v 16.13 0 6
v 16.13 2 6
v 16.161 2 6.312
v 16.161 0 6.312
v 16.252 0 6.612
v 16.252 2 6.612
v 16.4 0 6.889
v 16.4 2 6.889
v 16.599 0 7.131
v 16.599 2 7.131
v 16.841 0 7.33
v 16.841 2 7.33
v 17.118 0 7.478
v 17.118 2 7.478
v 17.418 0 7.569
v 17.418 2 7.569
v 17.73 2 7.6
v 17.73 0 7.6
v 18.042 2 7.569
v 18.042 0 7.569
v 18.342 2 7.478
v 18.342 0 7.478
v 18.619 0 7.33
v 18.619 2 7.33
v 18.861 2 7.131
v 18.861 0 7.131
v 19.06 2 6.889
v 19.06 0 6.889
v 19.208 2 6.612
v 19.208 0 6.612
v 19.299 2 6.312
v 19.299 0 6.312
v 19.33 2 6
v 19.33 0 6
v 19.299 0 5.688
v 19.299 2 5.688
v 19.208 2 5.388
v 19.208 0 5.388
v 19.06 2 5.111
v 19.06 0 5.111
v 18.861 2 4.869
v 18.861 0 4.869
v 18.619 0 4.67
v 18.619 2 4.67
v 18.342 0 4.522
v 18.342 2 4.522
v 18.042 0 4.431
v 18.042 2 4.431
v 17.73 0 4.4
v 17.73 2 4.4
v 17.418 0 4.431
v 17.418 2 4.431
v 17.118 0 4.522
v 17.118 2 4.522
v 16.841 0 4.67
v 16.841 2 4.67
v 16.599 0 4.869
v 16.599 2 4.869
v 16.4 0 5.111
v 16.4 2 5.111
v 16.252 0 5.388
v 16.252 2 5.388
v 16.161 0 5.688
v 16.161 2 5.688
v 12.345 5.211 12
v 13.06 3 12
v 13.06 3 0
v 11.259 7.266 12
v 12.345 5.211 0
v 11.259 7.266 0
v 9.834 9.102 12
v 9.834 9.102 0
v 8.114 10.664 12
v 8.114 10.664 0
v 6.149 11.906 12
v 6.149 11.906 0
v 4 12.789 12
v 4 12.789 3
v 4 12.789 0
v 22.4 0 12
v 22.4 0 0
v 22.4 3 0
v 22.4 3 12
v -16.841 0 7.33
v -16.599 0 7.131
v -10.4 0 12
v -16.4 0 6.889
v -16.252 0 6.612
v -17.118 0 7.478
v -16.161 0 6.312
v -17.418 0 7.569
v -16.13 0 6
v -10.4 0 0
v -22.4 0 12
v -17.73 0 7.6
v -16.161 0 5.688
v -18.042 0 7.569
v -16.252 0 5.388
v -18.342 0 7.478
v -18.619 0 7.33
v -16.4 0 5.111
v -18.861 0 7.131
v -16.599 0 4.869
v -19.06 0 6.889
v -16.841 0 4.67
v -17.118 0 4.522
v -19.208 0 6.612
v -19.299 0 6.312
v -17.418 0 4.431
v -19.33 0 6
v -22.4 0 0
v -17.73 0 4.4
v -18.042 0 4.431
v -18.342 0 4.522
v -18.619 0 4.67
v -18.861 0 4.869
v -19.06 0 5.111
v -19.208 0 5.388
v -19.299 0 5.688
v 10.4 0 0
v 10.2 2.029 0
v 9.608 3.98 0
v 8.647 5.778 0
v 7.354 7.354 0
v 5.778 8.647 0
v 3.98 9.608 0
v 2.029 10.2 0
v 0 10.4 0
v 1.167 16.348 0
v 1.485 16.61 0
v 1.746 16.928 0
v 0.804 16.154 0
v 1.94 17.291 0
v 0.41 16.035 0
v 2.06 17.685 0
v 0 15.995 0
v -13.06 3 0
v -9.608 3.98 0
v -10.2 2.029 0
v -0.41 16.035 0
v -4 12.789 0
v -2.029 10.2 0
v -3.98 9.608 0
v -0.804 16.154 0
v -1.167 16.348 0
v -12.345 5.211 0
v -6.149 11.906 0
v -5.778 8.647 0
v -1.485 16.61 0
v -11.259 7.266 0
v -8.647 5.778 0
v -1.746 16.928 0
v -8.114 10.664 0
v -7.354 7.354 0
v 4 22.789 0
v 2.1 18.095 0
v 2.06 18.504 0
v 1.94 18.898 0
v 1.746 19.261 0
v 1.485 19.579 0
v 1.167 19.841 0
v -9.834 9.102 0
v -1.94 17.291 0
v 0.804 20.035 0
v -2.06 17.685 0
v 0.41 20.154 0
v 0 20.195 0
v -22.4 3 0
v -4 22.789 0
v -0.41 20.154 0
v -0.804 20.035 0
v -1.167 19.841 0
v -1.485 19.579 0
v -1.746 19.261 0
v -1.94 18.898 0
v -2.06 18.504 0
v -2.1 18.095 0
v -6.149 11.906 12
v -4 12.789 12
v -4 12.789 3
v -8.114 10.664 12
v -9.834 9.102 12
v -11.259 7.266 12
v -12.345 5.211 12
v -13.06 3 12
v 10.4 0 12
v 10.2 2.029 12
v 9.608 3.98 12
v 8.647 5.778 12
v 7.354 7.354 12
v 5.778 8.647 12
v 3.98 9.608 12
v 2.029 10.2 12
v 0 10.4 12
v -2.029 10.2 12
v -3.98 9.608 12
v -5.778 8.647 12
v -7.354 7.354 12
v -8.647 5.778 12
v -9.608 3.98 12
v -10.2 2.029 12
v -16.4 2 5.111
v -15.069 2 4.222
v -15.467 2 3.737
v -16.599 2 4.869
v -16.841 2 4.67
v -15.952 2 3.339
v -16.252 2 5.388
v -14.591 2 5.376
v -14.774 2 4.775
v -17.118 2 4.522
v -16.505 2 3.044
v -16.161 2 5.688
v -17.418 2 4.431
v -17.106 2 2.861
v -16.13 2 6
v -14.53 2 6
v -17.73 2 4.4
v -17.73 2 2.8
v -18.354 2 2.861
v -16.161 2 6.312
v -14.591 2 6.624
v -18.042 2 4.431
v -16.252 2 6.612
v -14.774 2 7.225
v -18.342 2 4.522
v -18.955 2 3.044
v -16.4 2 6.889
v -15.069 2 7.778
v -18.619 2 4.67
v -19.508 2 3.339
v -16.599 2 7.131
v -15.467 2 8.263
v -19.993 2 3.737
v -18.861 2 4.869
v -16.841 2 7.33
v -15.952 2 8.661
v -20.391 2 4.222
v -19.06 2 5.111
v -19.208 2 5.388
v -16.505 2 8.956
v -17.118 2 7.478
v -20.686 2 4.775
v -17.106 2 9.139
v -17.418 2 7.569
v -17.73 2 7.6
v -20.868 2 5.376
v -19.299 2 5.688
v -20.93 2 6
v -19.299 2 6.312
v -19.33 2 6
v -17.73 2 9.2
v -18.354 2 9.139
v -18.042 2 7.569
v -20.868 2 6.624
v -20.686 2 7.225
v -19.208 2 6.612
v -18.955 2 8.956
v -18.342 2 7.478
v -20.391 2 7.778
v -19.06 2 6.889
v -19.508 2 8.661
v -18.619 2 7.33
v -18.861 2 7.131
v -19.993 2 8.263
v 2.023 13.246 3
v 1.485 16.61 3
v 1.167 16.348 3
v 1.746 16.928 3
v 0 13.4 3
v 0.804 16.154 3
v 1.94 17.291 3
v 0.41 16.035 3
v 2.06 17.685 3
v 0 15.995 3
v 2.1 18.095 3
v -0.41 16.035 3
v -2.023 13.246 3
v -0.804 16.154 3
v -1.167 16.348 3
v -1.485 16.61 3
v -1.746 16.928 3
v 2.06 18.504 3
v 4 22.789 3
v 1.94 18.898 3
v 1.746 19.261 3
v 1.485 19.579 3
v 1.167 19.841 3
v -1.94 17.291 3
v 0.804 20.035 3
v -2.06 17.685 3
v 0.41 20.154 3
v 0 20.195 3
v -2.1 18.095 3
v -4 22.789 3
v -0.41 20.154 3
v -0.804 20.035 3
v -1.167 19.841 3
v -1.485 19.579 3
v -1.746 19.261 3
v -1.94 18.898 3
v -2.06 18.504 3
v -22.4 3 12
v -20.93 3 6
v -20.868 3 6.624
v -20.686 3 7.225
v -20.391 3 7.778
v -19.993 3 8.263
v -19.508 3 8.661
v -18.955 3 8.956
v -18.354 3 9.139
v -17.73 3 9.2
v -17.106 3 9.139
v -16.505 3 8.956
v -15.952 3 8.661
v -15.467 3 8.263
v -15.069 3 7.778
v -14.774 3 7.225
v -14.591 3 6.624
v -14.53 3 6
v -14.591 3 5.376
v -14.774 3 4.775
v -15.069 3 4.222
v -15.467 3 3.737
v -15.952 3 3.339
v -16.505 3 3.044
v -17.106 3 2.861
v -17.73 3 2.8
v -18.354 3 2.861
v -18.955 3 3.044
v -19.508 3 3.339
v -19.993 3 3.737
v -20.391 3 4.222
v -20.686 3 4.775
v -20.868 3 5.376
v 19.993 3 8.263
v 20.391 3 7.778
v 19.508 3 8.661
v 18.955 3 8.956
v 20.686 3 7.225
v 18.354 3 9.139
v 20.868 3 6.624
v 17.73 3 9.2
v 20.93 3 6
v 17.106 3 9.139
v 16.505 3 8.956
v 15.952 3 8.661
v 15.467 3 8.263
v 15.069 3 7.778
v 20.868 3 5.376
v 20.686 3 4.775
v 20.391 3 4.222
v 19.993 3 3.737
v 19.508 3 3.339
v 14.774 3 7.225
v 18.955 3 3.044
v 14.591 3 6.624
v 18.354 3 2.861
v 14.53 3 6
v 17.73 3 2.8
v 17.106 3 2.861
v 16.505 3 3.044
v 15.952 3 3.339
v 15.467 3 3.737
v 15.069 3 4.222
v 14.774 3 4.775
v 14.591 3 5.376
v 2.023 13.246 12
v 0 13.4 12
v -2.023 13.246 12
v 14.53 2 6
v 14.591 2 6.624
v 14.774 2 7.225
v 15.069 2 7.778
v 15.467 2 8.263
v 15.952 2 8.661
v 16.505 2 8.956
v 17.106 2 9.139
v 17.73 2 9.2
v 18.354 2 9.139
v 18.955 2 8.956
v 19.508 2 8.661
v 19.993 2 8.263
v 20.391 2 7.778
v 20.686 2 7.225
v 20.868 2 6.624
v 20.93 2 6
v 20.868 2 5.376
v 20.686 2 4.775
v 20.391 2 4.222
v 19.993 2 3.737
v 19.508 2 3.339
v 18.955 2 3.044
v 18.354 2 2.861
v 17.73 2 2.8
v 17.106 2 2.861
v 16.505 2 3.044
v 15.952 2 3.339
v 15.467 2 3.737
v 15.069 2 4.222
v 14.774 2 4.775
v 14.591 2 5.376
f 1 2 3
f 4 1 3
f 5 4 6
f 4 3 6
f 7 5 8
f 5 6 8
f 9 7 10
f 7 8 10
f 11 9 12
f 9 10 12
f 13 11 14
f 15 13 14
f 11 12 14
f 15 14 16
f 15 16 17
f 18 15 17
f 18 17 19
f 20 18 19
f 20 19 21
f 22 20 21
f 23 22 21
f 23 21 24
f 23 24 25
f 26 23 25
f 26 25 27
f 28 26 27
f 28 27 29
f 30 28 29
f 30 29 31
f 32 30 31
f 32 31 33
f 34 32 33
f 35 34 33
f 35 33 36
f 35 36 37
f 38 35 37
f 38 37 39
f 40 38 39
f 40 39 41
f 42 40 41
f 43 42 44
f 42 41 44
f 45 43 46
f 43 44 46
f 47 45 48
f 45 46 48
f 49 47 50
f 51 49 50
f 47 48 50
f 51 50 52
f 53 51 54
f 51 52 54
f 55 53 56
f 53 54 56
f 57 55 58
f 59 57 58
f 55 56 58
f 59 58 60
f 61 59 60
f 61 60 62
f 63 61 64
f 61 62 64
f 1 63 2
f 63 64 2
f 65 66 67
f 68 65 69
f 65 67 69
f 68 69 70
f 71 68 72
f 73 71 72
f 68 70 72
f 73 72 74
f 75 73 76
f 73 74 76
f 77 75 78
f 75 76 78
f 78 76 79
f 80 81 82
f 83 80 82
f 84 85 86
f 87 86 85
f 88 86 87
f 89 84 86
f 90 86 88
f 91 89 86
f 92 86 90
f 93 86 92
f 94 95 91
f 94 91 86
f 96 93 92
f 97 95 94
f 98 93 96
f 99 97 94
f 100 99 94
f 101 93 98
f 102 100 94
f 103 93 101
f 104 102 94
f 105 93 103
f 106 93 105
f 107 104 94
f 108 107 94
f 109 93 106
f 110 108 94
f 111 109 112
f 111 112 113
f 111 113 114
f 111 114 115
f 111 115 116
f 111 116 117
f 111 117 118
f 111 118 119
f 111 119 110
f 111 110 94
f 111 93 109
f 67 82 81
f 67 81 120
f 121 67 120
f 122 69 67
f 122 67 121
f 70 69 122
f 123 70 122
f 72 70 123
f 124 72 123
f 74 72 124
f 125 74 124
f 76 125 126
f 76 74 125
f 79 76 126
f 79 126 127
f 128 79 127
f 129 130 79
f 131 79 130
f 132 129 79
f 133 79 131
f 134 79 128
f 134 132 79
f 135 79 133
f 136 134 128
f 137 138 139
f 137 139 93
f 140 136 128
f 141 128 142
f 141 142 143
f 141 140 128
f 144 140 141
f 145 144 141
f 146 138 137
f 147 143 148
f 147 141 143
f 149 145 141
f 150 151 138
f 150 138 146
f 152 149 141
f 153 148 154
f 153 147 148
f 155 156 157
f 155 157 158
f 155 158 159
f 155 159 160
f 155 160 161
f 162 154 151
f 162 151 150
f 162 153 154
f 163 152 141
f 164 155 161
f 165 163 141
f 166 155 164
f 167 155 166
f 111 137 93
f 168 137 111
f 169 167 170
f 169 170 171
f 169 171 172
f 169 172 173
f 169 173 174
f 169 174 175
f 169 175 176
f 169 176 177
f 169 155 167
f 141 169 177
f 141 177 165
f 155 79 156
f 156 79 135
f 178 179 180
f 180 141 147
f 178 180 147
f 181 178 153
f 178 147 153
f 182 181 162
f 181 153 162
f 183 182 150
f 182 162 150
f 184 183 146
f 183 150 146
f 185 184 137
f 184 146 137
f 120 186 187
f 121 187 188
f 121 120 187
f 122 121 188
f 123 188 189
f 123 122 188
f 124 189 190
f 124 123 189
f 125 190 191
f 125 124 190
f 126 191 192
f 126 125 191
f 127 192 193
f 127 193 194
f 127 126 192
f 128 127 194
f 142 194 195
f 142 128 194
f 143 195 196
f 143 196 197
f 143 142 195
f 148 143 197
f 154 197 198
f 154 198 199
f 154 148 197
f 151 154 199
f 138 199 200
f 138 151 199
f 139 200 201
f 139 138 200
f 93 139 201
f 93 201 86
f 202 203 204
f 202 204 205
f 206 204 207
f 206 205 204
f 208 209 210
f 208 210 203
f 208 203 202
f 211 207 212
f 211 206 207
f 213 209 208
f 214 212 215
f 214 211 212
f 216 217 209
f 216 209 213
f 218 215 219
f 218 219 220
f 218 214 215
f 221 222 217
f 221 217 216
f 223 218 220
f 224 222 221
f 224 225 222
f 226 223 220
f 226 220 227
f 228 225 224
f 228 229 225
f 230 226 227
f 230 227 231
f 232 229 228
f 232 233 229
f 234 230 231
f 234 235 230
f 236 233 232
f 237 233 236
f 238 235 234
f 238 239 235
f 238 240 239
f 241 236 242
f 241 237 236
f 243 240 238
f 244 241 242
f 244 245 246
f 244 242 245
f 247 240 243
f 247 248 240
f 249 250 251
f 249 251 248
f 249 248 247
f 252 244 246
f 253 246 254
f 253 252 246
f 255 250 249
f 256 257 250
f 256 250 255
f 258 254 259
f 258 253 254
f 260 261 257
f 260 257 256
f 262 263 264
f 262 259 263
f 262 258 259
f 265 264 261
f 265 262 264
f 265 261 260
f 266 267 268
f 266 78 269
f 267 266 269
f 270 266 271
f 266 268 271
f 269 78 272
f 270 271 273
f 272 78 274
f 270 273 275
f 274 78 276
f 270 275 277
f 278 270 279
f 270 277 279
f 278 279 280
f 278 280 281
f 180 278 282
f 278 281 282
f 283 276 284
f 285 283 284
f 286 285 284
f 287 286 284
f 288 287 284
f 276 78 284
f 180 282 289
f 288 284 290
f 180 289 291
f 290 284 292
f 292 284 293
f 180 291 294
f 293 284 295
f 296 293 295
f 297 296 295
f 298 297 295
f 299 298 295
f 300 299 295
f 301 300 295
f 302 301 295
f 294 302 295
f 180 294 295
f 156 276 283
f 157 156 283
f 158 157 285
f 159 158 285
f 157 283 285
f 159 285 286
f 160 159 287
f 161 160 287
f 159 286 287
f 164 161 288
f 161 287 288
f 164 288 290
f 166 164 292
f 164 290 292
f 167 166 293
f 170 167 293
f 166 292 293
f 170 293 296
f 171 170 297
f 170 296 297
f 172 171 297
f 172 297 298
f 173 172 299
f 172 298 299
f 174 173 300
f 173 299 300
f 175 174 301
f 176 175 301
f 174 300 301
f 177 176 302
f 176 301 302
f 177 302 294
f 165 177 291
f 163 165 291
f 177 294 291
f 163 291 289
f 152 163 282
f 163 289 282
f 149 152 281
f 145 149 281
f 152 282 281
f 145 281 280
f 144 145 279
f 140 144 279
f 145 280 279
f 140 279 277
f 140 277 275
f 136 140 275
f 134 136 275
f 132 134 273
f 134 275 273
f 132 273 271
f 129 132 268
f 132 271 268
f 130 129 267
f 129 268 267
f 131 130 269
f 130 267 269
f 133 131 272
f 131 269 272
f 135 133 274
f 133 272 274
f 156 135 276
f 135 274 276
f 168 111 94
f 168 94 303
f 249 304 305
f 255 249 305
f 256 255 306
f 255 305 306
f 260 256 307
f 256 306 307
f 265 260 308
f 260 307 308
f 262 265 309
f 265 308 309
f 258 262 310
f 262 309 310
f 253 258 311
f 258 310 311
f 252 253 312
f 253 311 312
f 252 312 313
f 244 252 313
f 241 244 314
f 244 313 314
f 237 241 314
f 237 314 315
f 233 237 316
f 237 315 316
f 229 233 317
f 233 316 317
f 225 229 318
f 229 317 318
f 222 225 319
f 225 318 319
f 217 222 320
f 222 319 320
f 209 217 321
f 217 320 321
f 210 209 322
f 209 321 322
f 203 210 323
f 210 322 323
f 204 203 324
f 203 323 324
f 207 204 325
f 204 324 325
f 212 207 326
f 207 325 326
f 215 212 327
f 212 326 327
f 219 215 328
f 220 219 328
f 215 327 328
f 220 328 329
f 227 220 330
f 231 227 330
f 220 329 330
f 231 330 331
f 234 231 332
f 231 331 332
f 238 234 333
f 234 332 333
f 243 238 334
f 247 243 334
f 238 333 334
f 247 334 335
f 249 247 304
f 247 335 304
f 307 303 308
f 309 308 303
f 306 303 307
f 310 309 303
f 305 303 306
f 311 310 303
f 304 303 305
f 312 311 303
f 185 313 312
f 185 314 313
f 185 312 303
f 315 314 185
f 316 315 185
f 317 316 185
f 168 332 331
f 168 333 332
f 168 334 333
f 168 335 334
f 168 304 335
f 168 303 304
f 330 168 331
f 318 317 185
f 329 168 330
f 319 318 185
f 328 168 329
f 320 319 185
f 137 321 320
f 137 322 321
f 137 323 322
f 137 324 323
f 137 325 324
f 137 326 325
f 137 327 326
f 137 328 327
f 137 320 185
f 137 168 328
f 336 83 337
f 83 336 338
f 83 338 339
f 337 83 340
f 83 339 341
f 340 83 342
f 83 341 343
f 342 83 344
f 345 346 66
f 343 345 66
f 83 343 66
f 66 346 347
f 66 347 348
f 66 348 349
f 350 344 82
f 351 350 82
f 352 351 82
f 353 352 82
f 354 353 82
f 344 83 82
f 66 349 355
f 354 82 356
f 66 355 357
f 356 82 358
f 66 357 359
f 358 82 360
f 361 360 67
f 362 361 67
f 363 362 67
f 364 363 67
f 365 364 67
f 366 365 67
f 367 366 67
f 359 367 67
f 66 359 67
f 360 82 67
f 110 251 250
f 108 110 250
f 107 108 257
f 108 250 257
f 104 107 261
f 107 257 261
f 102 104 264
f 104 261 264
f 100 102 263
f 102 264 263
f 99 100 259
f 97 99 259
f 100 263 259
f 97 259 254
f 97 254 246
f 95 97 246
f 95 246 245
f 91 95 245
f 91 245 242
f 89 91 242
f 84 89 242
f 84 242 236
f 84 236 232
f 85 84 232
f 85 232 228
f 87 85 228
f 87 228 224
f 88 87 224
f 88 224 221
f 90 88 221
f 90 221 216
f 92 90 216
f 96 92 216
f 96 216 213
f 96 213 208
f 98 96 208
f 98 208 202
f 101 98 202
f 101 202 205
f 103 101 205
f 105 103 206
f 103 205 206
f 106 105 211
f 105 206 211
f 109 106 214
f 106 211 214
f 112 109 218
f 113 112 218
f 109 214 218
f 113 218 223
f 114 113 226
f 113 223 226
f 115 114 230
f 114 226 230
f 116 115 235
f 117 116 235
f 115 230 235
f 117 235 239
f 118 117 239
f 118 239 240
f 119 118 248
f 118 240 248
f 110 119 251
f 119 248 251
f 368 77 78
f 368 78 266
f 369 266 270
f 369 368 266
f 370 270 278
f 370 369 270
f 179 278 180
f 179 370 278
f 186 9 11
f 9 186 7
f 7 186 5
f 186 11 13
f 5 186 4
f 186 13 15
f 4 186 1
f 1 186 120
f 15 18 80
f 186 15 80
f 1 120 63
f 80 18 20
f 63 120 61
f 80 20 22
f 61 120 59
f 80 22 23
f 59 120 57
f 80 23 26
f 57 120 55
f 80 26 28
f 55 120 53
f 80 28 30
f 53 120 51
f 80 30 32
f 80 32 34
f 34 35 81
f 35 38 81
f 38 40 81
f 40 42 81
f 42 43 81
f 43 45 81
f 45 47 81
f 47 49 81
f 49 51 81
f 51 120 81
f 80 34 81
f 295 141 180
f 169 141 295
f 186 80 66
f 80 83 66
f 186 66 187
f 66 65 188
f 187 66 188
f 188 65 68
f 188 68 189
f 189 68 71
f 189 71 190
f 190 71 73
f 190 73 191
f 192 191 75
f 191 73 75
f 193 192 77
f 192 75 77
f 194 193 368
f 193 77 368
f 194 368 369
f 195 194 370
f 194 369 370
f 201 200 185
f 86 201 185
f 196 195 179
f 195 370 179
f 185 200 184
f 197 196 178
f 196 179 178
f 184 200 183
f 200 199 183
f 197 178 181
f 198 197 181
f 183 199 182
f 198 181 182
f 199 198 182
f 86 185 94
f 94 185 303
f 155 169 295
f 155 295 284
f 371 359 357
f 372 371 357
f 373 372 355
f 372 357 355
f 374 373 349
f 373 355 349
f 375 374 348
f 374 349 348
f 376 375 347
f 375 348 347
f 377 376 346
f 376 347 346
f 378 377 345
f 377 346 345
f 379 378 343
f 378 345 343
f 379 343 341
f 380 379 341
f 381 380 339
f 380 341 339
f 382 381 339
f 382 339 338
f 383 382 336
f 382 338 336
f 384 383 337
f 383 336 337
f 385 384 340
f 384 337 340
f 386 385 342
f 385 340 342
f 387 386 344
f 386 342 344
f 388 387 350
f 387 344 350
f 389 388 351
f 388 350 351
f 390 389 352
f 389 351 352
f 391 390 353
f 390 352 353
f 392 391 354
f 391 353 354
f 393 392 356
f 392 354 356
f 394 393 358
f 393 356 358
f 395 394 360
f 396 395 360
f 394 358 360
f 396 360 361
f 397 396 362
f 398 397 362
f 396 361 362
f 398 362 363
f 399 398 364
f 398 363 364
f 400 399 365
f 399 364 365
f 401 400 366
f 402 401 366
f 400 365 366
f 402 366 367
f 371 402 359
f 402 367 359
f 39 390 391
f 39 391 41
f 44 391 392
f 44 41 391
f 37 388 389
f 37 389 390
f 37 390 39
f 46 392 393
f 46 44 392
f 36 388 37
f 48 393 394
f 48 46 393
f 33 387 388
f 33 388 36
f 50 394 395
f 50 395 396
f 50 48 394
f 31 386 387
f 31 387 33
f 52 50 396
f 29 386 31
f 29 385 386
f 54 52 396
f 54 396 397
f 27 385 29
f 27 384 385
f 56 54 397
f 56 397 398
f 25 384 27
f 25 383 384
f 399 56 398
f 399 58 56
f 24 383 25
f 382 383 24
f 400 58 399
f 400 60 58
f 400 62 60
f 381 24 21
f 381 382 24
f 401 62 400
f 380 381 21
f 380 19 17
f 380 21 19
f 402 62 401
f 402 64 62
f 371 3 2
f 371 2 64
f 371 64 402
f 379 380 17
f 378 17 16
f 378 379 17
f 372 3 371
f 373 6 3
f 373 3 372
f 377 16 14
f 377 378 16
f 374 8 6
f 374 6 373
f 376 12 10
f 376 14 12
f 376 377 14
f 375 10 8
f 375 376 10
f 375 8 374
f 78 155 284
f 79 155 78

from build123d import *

# Parameters (mm, degrees)
PAD_DEPTH       = 12
POCKET_DEPTH    = 9
SKETCH002_R     = 2.1
POCKET001_DEPTH = 3
SKETCH003_R     = 1.6
POCKET002_DEPTH = 3.001
SKETCH004_R     = 3.2
POCKET003_DEPTH = 1


with BuildPart() as part:
    # Sketch → Pad (new body)
    with BuildSketch(Plane.XY):
        with BuildLine():
            ThreePointArc((10.4, 0), (0, 10.4), (-10.4, 0))
            Line((-10.4, 0), (-22.4, 0))
            Line((-22.4, 0), (-22.4, 3))
            Line((-22.4, 3), (-13.059862, 3))
            ThreePointArc((-4, 12.789058), (-9.834436, 9.10186), (-13.059862, 3))
            Line((-4, 12.789058), (-4, 22.789058))
            Line((-4, 22.789058), (4, 22.789058))
            Line((4, 22.789058), (4, 12.789058))
            ThreePointArc((13.059862, 3), (9.834436, 9.10186), (4, 12.789058))
            Line((22.4, 3), (13.059862, 3))
            Line((22.4, 0), (22.4, 3))
            Line((10.4, 0), (22.4, 0))
        make_face()
    extrude(amount=PAD_DEPTH)

    # Sketch001 (on Face14 of Pad) → Pocket (cut)
    with BuildSketch(Plane.XY.offset(12)):
        with BuildLine():
            Line((-4, 12.789058), (-4, 22.789058))
            Line((-4, 22.789058), (4, 22.789058))
            Line((4, 22.789058), (4, 12.789058))
            ThreePointArc((4, 12.789058), (0, 13.4), (-4, 12.789058))
        make_face()
    extrude(amount=-POCKET_DEPTH, mode=Mode.SUBTRACT)

    # Sketch002 (on Face16 of Pocket) → Pocket001 (cut)
    with BuildSketch(Plane.XY.offset(3)):
        with Locations((0, 18.094529)):
            Circle(SKETCH002_R)
    extrude(amount=-POCKET001_DEPTH, mode=Mode.SUBTRACT)

    # Sketch003 (on Face9 of Pocket001) → Pocket002 (cut, through all)
    with BuildSketch(Plane(origin=(0, 3, 0), x_dir=(-1, 0, 0), z_dir=(0, 1, 0))):
        with Locations((-17.729931, 6)):
            Circle(SKETCH003_R)
        with Locations((17.729931, 6)):
            Circle(SKETCH003_R)
    extrude(amount=-POCKET002_DEPTH, mode=Mode.SUBTRACT)

    # Sketch004 (on Face11 of Pocket002) → Pocket003 (cut)
    with BuildSketch(Plane(origin=(0, 3, 0), x_dir=(-1, 0, 0), z_dir=(0, 1, 0))):
        with Locations((-17.729931, 6)):
            Circle(SKETCH004_R)
        with Locations((17.729931, 6)):
            Circle(SKETCH004_R)
    extrude(amount=-POCKET003_DEPTH, mode=Mode.SUBTRACT)


solid = part.part
